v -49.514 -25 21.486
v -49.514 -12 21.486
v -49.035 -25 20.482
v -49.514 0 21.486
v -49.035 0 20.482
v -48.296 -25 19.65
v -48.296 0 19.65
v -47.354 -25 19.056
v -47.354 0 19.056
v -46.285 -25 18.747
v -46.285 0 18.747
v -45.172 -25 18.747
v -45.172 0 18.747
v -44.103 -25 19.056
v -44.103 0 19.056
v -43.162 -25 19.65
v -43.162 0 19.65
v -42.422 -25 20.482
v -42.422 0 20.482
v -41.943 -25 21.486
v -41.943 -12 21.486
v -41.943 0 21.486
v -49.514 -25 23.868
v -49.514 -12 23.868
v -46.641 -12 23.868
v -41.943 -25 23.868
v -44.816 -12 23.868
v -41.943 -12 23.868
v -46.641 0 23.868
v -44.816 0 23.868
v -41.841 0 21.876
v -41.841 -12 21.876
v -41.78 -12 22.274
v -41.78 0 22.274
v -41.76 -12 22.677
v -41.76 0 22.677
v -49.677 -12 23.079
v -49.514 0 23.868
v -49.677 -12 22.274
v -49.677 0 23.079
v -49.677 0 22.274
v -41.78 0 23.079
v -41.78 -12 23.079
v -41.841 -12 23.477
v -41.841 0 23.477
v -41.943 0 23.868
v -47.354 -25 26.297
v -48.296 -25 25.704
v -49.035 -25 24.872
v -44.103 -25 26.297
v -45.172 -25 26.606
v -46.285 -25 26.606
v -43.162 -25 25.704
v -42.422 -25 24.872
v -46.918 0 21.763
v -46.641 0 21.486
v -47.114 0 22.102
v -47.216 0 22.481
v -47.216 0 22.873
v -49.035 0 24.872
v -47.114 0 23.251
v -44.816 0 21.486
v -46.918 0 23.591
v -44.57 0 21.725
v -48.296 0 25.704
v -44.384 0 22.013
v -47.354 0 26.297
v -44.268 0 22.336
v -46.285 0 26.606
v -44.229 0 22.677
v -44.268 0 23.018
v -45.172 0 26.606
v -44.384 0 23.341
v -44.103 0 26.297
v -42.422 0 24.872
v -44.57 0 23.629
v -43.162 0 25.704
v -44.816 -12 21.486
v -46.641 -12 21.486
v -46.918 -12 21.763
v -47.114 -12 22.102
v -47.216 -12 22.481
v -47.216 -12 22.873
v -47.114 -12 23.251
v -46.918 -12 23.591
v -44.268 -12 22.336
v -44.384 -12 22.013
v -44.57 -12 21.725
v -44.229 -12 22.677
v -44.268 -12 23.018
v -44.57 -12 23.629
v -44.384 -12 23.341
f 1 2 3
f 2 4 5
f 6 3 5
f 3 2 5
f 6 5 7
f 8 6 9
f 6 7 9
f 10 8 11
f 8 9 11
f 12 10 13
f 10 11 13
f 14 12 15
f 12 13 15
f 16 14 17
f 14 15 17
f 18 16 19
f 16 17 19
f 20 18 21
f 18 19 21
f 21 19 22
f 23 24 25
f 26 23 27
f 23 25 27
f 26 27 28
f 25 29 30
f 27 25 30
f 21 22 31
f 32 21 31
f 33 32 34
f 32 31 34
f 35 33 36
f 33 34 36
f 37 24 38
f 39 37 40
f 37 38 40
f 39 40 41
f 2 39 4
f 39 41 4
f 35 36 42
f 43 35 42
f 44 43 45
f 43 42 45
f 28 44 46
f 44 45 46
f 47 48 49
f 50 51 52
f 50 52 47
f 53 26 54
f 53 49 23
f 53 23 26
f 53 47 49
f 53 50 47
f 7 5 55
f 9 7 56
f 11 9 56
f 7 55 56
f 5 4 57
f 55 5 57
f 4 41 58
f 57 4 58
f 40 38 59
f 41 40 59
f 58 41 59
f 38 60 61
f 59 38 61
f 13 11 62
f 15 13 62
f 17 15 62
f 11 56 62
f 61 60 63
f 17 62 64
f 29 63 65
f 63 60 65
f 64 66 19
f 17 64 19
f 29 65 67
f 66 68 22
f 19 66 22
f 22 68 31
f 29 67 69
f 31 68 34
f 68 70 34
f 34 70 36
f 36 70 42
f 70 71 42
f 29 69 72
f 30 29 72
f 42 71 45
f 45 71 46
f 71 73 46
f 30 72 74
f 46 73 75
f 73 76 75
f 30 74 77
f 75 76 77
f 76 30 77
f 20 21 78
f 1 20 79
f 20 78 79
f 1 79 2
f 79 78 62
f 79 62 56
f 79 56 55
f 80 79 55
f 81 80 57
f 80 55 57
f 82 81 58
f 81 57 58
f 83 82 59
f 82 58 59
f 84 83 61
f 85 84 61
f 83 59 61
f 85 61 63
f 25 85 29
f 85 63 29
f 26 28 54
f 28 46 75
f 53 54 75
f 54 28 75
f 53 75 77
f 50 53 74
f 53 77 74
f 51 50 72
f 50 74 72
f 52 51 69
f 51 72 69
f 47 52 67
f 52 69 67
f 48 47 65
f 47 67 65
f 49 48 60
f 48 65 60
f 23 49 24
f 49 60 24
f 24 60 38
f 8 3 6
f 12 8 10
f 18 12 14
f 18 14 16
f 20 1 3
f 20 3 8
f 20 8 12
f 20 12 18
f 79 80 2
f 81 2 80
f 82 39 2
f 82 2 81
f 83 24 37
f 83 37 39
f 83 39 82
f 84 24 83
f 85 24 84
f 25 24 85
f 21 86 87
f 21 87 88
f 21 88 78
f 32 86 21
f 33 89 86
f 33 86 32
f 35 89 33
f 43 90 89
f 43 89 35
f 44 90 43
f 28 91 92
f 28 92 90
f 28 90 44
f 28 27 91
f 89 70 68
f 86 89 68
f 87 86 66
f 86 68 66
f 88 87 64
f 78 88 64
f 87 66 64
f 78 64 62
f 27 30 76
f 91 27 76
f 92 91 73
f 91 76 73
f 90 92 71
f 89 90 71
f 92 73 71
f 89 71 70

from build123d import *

# Parameters (mm, degrees)
F1_DEPTH = 25
F2_DEPTH = 12


# Not quite as in the source:
# - a feature names something its author has since deleted; it is built from what else it names


with BuildPart() as f1:
    # F0 (on Front) → F1 (new body)
    with BuildSketch(Plane.XZ):
        with BuildLine():
            Line((-44.8163774249, 23.8675290289), (-41.9426736004, 23.8675290289))
            ThreePointArc((-41.9426736004, 23.8675290289), (-45.7285804931, 26.6455290289), (-49.5144873857, 23.8675290289))
            Line((-49.5144873857, 23.8675290289), (-46.6407835612, 23.8675290289))
            ThreePointArc((-46.6407835612, 23.8675290289), (-45.7285804931, 24.1767790289), (-44.8163774249, 23.8675290289))
        make_face()
        with BuildLine():
            Line((-46.6407835612, 23.8675290289), (-44.8163774249, 23.8675290289))
            ThreePointArc((-44.8163774249, 23.8675290289), (-45.7285804931, 24.1767790289), (-46.6407835612, 23.8675290289))
        make_face()
    extrude(amount=F1_DEPTH)



with BuildPart() as f1b:
    # F0 (on Front) → F1, piece 2 (new body)
    with BuildSketch(Plane.XZ):
        with BuildLine():
            ThreePointArc((-49.5144873857, 21.4860290289), (-45.7285804931, 18.7080290289), (-41.9426736004, 21.4860290289))
            Line((-41.9426736004, 21.4860290289), (-44.8163774249, 21.4860290289))
            ThreePointArc((-44.8163774249, 21.4860290289), (-45.7285804931, 21.1767790289), (-46.6407835612, 21.4860290289))
            Line((-46.6407835612, 21.4860290289), (-49.5144873857, 21.4860290289))
        make_face()
        with BuildLine():
            ThreePointArc((-46.6407835612, 21.4860290289), (-45.7285804931, 21.1767790289), (-44.8163774249, 21.4860290289))
            Line((-44.8163774249, 21.4860290289), (-46.6407835612, 21.4860290289))
        make_face()
    extrude(amount=F1_DEPTH)


with BuildPart() as f1_1:
    add(f1.part)

    add(f1b.part)  # F2 merges F1b
    # F0 (on Front) → F2 (join)
    with BuildSketch(Plane.XZ):
        with BuildLine():
            Line((-46.6407835612, 23.8675290289), (-49.5144873857, 23.8675290289))
            ThreePointArc((-49.5144873857, 23.8675290289), (-49.6973304931, 22.6767790289), (-49.5144873857, 21.4860290289))
            Line((-49.5144873857, 21.4860290289), (-46.6407835612, 21.4860290289))
            ThreePointArc((-46.6407835612, 21.4860290289), (-47.2285804931, 22.6767790289), (-46.6407835612, 23.8675290289))
        make_face()
        with BuildLine():
            ThreePointArc((-41.9426736004, 21.4860290289), (-41.8058075872, 22.0744259007), (-41.7598304931, 22.6767790289))
            ThreePointArc((-41.7598304931, 22.6767790289), (-41.8058075872, 23.2791321571), (-41.9426736004, 23.8675290289))
            Line((-41.9426736004, 23.8675290289), (-44.8163774249, 23.8675290289))
            ThreePointArc((-44.8163774249, 23.8675290289), (-44.3835331701, 23.3407426566), (-44.2285804931, 22.6767790289))
            ThreePointArc((-44.2285804931, 22.6767790289), (-44.3835331701, 22.0128154012), (-44.8163774249, 21.4860290289))
            Line((-44.8163774249, 21.4860290289), (-41.9426736004, 21.4860290289))
        make_face()
    extrude(amount=F2_DEPTH)


solid = f1_1.part
